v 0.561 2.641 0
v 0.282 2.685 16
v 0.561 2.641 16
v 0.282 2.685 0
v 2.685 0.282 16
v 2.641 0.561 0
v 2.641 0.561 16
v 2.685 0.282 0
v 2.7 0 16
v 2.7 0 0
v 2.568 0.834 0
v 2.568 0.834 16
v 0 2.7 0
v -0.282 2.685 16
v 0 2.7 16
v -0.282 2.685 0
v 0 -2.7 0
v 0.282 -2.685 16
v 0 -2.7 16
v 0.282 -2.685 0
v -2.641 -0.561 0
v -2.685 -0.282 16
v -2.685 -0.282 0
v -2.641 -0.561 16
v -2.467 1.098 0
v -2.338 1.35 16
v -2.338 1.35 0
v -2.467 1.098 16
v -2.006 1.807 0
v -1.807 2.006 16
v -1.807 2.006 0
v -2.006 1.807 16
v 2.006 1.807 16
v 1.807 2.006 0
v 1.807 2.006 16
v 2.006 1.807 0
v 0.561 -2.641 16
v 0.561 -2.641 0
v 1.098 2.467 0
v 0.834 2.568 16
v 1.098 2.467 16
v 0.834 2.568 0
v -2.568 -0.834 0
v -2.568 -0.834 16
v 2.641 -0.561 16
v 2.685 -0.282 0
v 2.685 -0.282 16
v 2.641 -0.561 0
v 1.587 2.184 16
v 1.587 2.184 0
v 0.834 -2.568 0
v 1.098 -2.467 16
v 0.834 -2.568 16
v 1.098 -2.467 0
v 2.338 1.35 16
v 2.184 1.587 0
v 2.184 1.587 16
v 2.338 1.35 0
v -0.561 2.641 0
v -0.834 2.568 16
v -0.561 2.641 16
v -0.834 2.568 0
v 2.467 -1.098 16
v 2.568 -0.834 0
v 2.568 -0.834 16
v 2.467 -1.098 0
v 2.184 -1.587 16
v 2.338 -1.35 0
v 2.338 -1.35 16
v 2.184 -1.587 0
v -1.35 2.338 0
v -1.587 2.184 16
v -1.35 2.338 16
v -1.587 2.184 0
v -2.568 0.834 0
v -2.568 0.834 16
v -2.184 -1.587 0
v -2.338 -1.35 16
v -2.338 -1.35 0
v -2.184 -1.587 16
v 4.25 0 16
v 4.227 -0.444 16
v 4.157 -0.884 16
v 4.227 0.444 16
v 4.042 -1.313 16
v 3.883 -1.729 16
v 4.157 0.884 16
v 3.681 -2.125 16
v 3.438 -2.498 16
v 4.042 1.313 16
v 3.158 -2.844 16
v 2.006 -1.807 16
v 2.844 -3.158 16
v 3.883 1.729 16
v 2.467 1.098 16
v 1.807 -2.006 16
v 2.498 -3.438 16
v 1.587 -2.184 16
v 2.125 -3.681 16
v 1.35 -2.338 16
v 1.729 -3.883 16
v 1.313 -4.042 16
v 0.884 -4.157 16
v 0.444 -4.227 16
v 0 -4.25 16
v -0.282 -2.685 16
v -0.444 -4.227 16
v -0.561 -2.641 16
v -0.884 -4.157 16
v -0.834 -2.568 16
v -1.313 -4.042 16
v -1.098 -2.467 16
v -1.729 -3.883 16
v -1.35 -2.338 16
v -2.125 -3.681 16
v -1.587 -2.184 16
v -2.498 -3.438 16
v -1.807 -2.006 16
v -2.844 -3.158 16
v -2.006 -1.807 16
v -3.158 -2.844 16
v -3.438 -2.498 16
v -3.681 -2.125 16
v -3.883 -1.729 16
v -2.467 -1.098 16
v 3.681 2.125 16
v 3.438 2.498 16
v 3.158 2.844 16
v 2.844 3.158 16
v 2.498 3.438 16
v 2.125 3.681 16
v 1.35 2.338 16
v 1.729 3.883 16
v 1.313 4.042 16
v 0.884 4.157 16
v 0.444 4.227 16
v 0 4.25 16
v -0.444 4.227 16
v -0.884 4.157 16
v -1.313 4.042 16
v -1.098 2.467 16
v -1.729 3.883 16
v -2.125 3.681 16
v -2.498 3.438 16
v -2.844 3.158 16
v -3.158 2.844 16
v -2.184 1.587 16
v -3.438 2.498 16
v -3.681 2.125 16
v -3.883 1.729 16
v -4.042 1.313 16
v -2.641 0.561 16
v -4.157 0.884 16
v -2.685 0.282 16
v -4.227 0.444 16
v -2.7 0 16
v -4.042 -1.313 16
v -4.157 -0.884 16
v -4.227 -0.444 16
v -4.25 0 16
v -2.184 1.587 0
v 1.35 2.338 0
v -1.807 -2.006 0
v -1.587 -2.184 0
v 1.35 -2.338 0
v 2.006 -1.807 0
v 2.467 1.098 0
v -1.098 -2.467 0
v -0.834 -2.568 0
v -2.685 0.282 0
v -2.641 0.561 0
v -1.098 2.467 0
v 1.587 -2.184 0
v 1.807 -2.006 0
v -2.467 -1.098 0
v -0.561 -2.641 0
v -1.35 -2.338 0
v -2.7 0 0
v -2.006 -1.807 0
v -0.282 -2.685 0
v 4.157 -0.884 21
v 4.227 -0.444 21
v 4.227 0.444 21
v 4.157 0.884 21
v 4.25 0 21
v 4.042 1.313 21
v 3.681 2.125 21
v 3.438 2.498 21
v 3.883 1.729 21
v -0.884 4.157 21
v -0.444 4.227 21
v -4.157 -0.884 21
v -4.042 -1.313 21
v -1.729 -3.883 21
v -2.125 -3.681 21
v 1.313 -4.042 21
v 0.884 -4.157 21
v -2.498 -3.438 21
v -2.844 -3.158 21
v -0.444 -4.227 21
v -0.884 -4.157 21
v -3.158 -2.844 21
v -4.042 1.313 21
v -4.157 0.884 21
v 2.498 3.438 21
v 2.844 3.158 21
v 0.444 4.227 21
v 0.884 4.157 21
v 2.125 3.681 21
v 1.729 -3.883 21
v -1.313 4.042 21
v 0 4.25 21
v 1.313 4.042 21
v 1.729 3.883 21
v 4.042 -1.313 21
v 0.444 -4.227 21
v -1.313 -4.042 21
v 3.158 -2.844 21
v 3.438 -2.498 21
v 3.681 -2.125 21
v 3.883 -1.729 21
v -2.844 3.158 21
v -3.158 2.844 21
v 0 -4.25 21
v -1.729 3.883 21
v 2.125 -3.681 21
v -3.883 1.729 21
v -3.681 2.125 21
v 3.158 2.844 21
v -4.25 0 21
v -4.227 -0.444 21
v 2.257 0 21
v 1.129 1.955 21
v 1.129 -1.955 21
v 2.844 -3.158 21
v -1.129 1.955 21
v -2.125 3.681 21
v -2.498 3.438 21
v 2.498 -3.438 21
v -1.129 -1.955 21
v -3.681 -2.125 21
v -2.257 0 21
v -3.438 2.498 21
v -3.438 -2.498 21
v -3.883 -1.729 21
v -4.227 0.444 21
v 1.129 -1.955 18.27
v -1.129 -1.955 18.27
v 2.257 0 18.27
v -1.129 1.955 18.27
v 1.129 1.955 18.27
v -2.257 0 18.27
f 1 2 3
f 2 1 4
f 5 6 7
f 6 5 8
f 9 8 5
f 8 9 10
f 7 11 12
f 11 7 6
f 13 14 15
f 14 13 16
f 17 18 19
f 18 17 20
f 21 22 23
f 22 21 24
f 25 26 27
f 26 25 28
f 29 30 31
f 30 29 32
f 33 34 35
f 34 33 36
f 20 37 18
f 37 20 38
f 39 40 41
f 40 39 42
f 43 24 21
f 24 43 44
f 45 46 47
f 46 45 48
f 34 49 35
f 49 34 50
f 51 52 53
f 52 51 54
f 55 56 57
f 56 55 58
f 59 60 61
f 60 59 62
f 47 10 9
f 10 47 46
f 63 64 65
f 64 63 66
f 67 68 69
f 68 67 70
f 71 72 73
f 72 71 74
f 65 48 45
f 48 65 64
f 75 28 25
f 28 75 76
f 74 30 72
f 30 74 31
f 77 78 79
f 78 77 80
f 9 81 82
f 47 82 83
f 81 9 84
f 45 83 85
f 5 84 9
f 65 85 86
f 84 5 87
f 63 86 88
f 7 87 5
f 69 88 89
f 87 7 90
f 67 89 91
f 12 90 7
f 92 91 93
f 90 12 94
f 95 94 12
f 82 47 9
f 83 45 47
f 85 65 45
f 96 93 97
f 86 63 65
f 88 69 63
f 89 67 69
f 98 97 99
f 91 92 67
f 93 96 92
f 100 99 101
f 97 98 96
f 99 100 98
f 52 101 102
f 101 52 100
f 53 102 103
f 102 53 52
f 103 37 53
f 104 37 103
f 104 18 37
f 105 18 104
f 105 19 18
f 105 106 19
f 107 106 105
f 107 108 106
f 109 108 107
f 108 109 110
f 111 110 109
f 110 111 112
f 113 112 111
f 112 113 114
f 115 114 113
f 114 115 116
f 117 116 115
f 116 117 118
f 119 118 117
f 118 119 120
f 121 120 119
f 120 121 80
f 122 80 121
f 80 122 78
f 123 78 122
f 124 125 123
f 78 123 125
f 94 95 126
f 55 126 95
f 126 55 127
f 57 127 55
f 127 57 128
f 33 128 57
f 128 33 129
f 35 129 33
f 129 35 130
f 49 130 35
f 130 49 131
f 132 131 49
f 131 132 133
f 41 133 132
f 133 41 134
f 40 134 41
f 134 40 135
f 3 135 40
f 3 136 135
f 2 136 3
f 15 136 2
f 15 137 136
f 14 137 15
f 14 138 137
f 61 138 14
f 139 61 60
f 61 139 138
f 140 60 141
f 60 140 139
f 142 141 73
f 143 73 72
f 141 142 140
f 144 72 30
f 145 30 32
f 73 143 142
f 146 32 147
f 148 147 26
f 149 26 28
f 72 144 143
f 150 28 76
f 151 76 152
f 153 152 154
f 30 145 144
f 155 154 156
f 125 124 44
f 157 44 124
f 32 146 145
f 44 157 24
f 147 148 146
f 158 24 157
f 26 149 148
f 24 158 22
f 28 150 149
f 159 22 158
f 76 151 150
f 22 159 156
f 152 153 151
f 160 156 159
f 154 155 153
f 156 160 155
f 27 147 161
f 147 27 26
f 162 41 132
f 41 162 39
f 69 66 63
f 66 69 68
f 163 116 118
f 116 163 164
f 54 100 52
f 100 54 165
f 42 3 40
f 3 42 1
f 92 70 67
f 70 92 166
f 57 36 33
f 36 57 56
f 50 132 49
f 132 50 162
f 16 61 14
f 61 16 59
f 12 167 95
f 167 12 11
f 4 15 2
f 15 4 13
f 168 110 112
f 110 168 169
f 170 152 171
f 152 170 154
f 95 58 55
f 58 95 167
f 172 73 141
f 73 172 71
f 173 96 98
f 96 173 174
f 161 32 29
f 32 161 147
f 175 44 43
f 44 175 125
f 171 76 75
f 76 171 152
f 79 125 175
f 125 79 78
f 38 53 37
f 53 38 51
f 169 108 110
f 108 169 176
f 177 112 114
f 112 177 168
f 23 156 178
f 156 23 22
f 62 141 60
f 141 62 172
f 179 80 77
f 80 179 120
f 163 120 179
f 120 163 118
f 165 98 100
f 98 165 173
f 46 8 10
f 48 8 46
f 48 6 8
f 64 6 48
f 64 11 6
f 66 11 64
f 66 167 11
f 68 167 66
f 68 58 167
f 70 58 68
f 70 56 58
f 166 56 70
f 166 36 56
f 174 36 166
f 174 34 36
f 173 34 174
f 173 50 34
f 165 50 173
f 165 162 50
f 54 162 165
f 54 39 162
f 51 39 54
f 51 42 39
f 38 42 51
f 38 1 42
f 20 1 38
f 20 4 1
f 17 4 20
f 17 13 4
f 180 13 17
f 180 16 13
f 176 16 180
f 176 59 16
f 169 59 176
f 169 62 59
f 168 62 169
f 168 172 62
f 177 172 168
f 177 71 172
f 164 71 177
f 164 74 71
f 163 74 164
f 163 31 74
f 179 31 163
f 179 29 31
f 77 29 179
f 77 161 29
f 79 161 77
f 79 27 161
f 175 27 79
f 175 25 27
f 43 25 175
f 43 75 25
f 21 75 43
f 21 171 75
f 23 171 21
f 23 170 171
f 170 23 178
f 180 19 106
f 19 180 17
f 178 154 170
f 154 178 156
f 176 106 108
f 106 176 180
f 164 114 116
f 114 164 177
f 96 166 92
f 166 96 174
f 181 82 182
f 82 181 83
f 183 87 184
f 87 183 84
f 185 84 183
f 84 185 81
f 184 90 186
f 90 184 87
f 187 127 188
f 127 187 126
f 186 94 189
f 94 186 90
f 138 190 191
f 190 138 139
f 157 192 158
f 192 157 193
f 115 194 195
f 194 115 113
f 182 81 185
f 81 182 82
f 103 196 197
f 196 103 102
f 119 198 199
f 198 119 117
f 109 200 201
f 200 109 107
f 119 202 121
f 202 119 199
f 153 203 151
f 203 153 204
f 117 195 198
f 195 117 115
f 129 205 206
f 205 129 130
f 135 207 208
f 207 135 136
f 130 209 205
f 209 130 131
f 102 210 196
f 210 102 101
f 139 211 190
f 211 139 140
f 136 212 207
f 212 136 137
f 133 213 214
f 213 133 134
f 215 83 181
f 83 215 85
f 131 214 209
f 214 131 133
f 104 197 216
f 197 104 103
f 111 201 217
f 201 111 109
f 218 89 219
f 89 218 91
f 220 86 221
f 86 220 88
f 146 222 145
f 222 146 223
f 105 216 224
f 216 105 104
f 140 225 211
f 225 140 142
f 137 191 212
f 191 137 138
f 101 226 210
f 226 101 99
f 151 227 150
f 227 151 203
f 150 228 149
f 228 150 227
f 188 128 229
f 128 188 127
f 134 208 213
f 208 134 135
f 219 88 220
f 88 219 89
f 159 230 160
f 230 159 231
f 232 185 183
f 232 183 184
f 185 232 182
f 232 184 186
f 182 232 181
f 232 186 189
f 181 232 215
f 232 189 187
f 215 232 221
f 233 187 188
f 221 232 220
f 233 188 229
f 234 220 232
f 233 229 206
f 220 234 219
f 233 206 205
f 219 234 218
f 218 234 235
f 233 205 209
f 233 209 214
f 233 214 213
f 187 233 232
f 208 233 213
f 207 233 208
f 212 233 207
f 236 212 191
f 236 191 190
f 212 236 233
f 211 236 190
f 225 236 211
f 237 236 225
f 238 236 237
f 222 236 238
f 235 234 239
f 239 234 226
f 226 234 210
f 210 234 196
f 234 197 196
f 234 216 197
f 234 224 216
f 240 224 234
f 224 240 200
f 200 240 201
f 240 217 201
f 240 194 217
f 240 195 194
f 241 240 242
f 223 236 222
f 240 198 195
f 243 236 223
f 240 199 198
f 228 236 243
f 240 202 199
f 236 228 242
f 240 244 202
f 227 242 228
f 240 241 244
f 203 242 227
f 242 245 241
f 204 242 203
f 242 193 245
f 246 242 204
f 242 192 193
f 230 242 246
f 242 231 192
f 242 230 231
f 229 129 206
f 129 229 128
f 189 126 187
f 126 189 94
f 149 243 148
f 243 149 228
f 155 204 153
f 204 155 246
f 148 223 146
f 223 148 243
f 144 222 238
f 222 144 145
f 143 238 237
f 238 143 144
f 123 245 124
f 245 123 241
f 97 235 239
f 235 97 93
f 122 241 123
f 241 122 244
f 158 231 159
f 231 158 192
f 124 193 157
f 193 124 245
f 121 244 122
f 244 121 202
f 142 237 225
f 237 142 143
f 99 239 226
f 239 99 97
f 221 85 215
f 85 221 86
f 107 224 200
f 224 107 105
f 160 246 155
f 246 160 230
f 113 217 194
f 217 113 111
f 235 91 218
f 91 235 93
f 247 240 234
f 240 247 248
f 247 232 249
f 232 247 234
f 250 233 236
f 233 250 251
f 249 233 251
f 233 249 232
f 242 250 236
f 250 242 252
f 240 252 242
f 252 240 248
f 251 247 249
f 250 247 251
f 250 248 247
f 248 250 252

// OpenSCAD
// Socket-head cap screw, smooth printable representation.
$fn = 60;
eps = 0.02;
shaft_d = 5.4;
head_d = 8.5;
head_h = 5;
shaft_l = 16;
socket_flat = head_d * 0.46;
socket_depth = head_h * 0.55;
difference() {
    union() {
        cylinder(d = shaft_d, h = shaft_l);
        translate([0, 0, shaft_l]) cylinder(d = head_d, h = head_h);
    }
    translate([0, 0, shaft_l + head_h - socket_depth + eps])
        cylinder(d = socket_flat / cos(30), h = socket_depth + eps, $fn = 6);
}
